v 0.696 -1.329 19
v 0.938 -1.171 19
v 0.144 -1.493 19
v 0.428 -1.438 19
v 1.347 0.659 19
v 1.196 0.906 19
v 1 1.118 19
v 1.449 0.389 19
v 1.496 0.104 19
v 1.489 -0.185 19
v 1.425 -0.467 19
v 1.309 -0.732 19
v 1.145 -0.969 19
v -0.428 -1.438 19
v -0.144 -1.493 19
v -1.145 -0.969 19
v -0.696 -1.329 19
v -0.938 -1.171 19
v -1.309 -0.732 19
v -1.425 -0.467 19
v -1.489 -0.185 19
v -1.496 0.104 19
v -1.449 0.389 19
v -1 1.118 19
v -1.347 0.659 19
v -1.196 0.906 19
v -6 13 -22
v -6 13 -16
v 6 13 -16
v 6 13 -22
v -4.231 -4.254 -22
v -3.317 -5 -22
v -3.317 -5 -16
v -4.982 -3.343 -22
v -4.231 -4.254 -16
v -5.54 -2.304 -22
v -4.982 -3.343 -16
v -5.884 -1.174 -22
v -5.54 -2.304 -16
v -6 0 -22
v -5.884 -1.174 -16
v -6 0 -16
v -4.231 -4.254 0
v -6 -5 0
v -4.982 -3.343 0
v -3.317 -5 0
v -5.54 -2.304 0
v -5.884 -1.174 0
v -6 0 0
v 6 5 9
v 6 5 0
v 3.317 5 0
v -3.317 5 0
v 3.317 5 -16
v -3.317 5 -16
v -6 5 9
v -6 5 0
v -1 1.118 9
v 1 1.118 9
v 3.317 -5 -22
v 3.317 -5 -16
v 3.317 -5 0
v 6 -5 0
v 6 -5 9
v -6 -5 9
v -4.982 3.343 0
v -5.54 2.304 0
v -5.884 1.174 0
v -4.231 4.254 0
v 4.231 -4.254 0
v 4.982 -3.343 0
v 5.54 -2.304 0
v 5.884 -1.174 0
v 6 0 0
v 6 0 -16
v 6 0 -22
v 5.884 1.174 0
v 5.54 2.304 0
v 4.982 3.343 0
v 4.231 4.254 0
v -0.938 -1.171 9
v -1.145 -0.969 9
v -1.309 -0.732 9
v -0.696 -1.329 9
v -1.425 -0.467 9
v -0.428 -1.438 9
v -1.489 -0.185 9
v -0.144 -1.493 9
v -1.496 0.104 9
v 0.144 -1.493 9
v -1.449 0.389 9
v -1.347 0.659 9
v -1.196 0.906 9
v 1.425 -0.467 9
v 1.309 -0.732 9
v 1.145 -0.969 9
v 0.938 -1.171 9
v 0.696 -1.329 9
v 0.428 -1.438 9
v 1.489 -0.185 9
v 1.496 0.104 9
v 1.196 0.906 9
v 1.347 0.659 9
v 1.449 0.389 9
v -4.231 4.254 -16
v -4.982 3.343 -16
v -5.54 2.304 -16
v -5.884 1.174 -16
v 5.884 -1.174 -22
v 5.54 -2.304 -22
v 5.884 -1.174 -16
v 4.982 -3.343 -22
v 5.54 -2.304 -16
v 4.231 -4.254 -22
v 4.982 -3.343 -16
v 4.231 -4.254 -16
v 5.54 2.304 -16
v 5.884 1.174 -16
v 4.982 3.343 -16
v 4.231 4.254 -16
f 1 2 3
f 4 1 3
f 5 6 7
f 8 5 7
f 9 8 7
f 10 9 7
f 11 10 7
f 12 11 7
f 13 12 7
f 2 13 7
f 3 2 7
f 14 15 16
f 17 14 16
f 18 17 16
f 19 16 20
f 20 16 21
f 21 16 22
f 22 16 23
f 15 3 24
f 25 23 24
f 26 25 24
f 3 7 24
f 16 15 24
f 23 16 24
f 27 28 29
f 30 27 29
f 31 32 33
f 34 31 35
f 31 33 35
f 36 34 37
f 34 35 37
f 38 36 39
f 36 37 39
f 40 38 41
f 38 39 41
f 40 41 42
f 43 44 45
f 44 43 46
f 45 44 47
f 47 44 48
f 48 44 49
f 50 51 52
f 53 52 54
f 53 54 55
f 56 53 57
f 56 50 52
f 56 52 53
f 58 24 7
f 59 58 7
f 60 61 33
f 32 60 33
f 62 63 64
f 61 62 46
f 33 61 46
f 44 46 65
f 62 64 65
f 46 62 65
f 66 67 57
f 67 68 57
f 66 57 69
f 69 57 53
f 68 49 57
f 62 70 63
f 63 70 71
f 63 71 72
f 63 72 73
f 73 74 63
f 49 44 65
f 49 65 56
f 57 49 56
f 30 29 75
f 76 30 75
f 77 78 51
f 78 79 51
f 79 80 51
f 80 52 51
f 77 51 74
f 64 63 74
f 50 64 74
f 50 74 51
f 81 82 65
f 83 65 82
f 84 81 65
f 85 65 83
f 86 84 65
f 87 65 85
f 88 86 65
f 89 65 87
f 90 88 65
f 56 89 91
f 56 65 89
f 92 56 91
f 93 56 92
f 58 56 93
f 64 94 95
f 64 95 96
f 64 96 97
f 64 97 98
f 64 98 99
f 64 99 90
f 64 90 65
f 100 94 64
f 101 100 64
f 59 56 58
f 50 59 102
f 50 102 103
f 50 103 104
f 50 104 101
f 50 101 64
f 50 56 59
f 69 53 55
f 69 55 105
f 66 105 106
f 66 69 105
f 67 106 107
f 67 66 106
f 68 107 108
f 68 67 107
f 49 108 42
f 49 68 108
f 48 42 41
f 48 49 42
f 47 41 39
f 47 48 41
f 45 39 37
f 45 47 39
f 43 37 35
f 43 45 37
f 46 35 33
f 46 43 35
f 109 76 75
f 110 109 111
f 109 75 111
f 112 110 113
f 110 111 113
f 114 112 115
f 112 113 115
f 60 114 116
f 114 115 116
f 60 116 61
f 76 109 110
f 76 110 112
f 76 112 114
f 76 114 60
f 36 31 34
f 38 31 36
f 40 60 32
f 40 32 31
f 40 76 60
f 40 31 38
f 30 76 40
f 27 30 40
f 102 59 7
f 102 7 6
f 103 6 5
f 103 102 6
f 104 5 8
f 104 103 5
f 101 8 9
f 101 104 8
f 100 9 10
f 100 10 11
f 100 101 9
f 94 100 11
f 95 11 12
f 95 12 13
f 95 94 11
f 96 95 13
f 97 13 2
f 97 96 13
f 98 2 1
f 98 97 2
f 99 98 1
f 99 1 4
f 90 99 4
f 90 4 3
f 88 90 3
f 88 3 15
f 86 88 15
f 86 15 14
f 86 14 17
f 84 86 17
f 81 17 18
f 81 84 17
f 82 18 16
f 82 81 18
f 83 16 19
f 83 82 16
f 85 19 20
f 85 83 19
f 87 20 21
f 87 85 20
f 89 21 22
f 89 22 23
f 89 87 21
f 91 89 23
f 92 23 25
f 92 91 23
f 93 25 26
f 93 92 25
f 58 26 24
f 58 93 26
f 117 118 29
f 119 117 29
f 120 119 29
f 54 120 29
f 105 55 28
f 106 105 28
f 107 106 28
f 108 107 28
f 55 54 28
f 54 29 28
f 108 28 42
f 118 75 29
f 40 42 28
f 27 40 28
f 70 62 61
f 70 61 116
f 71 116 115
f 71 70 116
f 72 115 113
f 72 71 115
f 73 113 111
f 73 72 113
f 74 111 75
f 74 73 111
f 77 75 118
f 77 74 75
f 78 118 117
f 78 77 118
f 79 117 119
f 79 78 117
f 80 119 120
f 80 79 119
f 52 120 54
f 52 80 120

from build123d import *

# Parameters (mm, degrees)
ESQUISSE1_W        = 12
ESQUISSE1_H        = 10
BOSS_EXTRU_1_DEPTH = 9
BOSS_EXTRU_2_DEPTH = 10
BOSS_EXTRU_3_DEPTH = 16
BOSS_EXTRU_4_DEPTH = 6


with BuildPart() as part:
    # Esquisse1 → Boss.-Extru.1 (new body)
    with BuildSketch(Plane.XY):
        Rectangle(ESQUISSE1_W, ESQUISSE1_H)
    extrude(amount=BOSS_EXTRU_1_DEPTH)

    # Esquisse2 → Boss.-Extru.2 (add)
    with BuildSketch(Plane.XY.offset(9)):
        with BuildLine():
            Line((-1, 1.118033989), (1, 1.118033989))
            ThreePointArc((1, 1.118033989), (0, -1.5), (-1, 1.118033989))
        make_face()
    extrude(amount=BOSS_EXTRU_2_DEPTH)

    # Esquisse3 → Boss.-Extru.3 (add)
    with BuildSketch(Plane(origin=(0, 0, 0), x_dir=(-1, 0, 0), z_dir=(0, 0, -1))):
        with BuildLine():
            Line((-3.31662479, 5), (3.31662479, 5))
            ThreePointArc((3.31662479, 5), (6, 0), (3.31662479, -5))
            Line((3.31662479, -5), (-3.31662479, -5))
            ThreePointArc((-3.31662479, -5), (-6, 0), (-3.31662479, 5))
        make_face()
    extrude(amount=BOSS_EXTRU_3_DEPTH)

    # Esquisse4 → Boss.-Extru.4 (add)
    with BuildSketch(Plane(origin=(0, 0, -16), x_dir=(-1, 0, 0), z_dir=(0, 0, -1))):
        with BuildLine():
            Line((-3.31662479, -5), (3.31662479, -5))
            ThreePointArc((3.31662479, -5), (5.286764074, -2.837274331), (6, 0))
            Line((6, 0), (6, 13))
            Line((6, 13), (-6, 13))
            Line((-6, 13), (-6, 0))
            ThreePointArc((-6, 0), (-5.286764074, -2.837274331), (-3.31662479, -5))
        make_face()
    extrude(amount=BOSS_EXTRU_4_DEPTH)


solid = part.part
